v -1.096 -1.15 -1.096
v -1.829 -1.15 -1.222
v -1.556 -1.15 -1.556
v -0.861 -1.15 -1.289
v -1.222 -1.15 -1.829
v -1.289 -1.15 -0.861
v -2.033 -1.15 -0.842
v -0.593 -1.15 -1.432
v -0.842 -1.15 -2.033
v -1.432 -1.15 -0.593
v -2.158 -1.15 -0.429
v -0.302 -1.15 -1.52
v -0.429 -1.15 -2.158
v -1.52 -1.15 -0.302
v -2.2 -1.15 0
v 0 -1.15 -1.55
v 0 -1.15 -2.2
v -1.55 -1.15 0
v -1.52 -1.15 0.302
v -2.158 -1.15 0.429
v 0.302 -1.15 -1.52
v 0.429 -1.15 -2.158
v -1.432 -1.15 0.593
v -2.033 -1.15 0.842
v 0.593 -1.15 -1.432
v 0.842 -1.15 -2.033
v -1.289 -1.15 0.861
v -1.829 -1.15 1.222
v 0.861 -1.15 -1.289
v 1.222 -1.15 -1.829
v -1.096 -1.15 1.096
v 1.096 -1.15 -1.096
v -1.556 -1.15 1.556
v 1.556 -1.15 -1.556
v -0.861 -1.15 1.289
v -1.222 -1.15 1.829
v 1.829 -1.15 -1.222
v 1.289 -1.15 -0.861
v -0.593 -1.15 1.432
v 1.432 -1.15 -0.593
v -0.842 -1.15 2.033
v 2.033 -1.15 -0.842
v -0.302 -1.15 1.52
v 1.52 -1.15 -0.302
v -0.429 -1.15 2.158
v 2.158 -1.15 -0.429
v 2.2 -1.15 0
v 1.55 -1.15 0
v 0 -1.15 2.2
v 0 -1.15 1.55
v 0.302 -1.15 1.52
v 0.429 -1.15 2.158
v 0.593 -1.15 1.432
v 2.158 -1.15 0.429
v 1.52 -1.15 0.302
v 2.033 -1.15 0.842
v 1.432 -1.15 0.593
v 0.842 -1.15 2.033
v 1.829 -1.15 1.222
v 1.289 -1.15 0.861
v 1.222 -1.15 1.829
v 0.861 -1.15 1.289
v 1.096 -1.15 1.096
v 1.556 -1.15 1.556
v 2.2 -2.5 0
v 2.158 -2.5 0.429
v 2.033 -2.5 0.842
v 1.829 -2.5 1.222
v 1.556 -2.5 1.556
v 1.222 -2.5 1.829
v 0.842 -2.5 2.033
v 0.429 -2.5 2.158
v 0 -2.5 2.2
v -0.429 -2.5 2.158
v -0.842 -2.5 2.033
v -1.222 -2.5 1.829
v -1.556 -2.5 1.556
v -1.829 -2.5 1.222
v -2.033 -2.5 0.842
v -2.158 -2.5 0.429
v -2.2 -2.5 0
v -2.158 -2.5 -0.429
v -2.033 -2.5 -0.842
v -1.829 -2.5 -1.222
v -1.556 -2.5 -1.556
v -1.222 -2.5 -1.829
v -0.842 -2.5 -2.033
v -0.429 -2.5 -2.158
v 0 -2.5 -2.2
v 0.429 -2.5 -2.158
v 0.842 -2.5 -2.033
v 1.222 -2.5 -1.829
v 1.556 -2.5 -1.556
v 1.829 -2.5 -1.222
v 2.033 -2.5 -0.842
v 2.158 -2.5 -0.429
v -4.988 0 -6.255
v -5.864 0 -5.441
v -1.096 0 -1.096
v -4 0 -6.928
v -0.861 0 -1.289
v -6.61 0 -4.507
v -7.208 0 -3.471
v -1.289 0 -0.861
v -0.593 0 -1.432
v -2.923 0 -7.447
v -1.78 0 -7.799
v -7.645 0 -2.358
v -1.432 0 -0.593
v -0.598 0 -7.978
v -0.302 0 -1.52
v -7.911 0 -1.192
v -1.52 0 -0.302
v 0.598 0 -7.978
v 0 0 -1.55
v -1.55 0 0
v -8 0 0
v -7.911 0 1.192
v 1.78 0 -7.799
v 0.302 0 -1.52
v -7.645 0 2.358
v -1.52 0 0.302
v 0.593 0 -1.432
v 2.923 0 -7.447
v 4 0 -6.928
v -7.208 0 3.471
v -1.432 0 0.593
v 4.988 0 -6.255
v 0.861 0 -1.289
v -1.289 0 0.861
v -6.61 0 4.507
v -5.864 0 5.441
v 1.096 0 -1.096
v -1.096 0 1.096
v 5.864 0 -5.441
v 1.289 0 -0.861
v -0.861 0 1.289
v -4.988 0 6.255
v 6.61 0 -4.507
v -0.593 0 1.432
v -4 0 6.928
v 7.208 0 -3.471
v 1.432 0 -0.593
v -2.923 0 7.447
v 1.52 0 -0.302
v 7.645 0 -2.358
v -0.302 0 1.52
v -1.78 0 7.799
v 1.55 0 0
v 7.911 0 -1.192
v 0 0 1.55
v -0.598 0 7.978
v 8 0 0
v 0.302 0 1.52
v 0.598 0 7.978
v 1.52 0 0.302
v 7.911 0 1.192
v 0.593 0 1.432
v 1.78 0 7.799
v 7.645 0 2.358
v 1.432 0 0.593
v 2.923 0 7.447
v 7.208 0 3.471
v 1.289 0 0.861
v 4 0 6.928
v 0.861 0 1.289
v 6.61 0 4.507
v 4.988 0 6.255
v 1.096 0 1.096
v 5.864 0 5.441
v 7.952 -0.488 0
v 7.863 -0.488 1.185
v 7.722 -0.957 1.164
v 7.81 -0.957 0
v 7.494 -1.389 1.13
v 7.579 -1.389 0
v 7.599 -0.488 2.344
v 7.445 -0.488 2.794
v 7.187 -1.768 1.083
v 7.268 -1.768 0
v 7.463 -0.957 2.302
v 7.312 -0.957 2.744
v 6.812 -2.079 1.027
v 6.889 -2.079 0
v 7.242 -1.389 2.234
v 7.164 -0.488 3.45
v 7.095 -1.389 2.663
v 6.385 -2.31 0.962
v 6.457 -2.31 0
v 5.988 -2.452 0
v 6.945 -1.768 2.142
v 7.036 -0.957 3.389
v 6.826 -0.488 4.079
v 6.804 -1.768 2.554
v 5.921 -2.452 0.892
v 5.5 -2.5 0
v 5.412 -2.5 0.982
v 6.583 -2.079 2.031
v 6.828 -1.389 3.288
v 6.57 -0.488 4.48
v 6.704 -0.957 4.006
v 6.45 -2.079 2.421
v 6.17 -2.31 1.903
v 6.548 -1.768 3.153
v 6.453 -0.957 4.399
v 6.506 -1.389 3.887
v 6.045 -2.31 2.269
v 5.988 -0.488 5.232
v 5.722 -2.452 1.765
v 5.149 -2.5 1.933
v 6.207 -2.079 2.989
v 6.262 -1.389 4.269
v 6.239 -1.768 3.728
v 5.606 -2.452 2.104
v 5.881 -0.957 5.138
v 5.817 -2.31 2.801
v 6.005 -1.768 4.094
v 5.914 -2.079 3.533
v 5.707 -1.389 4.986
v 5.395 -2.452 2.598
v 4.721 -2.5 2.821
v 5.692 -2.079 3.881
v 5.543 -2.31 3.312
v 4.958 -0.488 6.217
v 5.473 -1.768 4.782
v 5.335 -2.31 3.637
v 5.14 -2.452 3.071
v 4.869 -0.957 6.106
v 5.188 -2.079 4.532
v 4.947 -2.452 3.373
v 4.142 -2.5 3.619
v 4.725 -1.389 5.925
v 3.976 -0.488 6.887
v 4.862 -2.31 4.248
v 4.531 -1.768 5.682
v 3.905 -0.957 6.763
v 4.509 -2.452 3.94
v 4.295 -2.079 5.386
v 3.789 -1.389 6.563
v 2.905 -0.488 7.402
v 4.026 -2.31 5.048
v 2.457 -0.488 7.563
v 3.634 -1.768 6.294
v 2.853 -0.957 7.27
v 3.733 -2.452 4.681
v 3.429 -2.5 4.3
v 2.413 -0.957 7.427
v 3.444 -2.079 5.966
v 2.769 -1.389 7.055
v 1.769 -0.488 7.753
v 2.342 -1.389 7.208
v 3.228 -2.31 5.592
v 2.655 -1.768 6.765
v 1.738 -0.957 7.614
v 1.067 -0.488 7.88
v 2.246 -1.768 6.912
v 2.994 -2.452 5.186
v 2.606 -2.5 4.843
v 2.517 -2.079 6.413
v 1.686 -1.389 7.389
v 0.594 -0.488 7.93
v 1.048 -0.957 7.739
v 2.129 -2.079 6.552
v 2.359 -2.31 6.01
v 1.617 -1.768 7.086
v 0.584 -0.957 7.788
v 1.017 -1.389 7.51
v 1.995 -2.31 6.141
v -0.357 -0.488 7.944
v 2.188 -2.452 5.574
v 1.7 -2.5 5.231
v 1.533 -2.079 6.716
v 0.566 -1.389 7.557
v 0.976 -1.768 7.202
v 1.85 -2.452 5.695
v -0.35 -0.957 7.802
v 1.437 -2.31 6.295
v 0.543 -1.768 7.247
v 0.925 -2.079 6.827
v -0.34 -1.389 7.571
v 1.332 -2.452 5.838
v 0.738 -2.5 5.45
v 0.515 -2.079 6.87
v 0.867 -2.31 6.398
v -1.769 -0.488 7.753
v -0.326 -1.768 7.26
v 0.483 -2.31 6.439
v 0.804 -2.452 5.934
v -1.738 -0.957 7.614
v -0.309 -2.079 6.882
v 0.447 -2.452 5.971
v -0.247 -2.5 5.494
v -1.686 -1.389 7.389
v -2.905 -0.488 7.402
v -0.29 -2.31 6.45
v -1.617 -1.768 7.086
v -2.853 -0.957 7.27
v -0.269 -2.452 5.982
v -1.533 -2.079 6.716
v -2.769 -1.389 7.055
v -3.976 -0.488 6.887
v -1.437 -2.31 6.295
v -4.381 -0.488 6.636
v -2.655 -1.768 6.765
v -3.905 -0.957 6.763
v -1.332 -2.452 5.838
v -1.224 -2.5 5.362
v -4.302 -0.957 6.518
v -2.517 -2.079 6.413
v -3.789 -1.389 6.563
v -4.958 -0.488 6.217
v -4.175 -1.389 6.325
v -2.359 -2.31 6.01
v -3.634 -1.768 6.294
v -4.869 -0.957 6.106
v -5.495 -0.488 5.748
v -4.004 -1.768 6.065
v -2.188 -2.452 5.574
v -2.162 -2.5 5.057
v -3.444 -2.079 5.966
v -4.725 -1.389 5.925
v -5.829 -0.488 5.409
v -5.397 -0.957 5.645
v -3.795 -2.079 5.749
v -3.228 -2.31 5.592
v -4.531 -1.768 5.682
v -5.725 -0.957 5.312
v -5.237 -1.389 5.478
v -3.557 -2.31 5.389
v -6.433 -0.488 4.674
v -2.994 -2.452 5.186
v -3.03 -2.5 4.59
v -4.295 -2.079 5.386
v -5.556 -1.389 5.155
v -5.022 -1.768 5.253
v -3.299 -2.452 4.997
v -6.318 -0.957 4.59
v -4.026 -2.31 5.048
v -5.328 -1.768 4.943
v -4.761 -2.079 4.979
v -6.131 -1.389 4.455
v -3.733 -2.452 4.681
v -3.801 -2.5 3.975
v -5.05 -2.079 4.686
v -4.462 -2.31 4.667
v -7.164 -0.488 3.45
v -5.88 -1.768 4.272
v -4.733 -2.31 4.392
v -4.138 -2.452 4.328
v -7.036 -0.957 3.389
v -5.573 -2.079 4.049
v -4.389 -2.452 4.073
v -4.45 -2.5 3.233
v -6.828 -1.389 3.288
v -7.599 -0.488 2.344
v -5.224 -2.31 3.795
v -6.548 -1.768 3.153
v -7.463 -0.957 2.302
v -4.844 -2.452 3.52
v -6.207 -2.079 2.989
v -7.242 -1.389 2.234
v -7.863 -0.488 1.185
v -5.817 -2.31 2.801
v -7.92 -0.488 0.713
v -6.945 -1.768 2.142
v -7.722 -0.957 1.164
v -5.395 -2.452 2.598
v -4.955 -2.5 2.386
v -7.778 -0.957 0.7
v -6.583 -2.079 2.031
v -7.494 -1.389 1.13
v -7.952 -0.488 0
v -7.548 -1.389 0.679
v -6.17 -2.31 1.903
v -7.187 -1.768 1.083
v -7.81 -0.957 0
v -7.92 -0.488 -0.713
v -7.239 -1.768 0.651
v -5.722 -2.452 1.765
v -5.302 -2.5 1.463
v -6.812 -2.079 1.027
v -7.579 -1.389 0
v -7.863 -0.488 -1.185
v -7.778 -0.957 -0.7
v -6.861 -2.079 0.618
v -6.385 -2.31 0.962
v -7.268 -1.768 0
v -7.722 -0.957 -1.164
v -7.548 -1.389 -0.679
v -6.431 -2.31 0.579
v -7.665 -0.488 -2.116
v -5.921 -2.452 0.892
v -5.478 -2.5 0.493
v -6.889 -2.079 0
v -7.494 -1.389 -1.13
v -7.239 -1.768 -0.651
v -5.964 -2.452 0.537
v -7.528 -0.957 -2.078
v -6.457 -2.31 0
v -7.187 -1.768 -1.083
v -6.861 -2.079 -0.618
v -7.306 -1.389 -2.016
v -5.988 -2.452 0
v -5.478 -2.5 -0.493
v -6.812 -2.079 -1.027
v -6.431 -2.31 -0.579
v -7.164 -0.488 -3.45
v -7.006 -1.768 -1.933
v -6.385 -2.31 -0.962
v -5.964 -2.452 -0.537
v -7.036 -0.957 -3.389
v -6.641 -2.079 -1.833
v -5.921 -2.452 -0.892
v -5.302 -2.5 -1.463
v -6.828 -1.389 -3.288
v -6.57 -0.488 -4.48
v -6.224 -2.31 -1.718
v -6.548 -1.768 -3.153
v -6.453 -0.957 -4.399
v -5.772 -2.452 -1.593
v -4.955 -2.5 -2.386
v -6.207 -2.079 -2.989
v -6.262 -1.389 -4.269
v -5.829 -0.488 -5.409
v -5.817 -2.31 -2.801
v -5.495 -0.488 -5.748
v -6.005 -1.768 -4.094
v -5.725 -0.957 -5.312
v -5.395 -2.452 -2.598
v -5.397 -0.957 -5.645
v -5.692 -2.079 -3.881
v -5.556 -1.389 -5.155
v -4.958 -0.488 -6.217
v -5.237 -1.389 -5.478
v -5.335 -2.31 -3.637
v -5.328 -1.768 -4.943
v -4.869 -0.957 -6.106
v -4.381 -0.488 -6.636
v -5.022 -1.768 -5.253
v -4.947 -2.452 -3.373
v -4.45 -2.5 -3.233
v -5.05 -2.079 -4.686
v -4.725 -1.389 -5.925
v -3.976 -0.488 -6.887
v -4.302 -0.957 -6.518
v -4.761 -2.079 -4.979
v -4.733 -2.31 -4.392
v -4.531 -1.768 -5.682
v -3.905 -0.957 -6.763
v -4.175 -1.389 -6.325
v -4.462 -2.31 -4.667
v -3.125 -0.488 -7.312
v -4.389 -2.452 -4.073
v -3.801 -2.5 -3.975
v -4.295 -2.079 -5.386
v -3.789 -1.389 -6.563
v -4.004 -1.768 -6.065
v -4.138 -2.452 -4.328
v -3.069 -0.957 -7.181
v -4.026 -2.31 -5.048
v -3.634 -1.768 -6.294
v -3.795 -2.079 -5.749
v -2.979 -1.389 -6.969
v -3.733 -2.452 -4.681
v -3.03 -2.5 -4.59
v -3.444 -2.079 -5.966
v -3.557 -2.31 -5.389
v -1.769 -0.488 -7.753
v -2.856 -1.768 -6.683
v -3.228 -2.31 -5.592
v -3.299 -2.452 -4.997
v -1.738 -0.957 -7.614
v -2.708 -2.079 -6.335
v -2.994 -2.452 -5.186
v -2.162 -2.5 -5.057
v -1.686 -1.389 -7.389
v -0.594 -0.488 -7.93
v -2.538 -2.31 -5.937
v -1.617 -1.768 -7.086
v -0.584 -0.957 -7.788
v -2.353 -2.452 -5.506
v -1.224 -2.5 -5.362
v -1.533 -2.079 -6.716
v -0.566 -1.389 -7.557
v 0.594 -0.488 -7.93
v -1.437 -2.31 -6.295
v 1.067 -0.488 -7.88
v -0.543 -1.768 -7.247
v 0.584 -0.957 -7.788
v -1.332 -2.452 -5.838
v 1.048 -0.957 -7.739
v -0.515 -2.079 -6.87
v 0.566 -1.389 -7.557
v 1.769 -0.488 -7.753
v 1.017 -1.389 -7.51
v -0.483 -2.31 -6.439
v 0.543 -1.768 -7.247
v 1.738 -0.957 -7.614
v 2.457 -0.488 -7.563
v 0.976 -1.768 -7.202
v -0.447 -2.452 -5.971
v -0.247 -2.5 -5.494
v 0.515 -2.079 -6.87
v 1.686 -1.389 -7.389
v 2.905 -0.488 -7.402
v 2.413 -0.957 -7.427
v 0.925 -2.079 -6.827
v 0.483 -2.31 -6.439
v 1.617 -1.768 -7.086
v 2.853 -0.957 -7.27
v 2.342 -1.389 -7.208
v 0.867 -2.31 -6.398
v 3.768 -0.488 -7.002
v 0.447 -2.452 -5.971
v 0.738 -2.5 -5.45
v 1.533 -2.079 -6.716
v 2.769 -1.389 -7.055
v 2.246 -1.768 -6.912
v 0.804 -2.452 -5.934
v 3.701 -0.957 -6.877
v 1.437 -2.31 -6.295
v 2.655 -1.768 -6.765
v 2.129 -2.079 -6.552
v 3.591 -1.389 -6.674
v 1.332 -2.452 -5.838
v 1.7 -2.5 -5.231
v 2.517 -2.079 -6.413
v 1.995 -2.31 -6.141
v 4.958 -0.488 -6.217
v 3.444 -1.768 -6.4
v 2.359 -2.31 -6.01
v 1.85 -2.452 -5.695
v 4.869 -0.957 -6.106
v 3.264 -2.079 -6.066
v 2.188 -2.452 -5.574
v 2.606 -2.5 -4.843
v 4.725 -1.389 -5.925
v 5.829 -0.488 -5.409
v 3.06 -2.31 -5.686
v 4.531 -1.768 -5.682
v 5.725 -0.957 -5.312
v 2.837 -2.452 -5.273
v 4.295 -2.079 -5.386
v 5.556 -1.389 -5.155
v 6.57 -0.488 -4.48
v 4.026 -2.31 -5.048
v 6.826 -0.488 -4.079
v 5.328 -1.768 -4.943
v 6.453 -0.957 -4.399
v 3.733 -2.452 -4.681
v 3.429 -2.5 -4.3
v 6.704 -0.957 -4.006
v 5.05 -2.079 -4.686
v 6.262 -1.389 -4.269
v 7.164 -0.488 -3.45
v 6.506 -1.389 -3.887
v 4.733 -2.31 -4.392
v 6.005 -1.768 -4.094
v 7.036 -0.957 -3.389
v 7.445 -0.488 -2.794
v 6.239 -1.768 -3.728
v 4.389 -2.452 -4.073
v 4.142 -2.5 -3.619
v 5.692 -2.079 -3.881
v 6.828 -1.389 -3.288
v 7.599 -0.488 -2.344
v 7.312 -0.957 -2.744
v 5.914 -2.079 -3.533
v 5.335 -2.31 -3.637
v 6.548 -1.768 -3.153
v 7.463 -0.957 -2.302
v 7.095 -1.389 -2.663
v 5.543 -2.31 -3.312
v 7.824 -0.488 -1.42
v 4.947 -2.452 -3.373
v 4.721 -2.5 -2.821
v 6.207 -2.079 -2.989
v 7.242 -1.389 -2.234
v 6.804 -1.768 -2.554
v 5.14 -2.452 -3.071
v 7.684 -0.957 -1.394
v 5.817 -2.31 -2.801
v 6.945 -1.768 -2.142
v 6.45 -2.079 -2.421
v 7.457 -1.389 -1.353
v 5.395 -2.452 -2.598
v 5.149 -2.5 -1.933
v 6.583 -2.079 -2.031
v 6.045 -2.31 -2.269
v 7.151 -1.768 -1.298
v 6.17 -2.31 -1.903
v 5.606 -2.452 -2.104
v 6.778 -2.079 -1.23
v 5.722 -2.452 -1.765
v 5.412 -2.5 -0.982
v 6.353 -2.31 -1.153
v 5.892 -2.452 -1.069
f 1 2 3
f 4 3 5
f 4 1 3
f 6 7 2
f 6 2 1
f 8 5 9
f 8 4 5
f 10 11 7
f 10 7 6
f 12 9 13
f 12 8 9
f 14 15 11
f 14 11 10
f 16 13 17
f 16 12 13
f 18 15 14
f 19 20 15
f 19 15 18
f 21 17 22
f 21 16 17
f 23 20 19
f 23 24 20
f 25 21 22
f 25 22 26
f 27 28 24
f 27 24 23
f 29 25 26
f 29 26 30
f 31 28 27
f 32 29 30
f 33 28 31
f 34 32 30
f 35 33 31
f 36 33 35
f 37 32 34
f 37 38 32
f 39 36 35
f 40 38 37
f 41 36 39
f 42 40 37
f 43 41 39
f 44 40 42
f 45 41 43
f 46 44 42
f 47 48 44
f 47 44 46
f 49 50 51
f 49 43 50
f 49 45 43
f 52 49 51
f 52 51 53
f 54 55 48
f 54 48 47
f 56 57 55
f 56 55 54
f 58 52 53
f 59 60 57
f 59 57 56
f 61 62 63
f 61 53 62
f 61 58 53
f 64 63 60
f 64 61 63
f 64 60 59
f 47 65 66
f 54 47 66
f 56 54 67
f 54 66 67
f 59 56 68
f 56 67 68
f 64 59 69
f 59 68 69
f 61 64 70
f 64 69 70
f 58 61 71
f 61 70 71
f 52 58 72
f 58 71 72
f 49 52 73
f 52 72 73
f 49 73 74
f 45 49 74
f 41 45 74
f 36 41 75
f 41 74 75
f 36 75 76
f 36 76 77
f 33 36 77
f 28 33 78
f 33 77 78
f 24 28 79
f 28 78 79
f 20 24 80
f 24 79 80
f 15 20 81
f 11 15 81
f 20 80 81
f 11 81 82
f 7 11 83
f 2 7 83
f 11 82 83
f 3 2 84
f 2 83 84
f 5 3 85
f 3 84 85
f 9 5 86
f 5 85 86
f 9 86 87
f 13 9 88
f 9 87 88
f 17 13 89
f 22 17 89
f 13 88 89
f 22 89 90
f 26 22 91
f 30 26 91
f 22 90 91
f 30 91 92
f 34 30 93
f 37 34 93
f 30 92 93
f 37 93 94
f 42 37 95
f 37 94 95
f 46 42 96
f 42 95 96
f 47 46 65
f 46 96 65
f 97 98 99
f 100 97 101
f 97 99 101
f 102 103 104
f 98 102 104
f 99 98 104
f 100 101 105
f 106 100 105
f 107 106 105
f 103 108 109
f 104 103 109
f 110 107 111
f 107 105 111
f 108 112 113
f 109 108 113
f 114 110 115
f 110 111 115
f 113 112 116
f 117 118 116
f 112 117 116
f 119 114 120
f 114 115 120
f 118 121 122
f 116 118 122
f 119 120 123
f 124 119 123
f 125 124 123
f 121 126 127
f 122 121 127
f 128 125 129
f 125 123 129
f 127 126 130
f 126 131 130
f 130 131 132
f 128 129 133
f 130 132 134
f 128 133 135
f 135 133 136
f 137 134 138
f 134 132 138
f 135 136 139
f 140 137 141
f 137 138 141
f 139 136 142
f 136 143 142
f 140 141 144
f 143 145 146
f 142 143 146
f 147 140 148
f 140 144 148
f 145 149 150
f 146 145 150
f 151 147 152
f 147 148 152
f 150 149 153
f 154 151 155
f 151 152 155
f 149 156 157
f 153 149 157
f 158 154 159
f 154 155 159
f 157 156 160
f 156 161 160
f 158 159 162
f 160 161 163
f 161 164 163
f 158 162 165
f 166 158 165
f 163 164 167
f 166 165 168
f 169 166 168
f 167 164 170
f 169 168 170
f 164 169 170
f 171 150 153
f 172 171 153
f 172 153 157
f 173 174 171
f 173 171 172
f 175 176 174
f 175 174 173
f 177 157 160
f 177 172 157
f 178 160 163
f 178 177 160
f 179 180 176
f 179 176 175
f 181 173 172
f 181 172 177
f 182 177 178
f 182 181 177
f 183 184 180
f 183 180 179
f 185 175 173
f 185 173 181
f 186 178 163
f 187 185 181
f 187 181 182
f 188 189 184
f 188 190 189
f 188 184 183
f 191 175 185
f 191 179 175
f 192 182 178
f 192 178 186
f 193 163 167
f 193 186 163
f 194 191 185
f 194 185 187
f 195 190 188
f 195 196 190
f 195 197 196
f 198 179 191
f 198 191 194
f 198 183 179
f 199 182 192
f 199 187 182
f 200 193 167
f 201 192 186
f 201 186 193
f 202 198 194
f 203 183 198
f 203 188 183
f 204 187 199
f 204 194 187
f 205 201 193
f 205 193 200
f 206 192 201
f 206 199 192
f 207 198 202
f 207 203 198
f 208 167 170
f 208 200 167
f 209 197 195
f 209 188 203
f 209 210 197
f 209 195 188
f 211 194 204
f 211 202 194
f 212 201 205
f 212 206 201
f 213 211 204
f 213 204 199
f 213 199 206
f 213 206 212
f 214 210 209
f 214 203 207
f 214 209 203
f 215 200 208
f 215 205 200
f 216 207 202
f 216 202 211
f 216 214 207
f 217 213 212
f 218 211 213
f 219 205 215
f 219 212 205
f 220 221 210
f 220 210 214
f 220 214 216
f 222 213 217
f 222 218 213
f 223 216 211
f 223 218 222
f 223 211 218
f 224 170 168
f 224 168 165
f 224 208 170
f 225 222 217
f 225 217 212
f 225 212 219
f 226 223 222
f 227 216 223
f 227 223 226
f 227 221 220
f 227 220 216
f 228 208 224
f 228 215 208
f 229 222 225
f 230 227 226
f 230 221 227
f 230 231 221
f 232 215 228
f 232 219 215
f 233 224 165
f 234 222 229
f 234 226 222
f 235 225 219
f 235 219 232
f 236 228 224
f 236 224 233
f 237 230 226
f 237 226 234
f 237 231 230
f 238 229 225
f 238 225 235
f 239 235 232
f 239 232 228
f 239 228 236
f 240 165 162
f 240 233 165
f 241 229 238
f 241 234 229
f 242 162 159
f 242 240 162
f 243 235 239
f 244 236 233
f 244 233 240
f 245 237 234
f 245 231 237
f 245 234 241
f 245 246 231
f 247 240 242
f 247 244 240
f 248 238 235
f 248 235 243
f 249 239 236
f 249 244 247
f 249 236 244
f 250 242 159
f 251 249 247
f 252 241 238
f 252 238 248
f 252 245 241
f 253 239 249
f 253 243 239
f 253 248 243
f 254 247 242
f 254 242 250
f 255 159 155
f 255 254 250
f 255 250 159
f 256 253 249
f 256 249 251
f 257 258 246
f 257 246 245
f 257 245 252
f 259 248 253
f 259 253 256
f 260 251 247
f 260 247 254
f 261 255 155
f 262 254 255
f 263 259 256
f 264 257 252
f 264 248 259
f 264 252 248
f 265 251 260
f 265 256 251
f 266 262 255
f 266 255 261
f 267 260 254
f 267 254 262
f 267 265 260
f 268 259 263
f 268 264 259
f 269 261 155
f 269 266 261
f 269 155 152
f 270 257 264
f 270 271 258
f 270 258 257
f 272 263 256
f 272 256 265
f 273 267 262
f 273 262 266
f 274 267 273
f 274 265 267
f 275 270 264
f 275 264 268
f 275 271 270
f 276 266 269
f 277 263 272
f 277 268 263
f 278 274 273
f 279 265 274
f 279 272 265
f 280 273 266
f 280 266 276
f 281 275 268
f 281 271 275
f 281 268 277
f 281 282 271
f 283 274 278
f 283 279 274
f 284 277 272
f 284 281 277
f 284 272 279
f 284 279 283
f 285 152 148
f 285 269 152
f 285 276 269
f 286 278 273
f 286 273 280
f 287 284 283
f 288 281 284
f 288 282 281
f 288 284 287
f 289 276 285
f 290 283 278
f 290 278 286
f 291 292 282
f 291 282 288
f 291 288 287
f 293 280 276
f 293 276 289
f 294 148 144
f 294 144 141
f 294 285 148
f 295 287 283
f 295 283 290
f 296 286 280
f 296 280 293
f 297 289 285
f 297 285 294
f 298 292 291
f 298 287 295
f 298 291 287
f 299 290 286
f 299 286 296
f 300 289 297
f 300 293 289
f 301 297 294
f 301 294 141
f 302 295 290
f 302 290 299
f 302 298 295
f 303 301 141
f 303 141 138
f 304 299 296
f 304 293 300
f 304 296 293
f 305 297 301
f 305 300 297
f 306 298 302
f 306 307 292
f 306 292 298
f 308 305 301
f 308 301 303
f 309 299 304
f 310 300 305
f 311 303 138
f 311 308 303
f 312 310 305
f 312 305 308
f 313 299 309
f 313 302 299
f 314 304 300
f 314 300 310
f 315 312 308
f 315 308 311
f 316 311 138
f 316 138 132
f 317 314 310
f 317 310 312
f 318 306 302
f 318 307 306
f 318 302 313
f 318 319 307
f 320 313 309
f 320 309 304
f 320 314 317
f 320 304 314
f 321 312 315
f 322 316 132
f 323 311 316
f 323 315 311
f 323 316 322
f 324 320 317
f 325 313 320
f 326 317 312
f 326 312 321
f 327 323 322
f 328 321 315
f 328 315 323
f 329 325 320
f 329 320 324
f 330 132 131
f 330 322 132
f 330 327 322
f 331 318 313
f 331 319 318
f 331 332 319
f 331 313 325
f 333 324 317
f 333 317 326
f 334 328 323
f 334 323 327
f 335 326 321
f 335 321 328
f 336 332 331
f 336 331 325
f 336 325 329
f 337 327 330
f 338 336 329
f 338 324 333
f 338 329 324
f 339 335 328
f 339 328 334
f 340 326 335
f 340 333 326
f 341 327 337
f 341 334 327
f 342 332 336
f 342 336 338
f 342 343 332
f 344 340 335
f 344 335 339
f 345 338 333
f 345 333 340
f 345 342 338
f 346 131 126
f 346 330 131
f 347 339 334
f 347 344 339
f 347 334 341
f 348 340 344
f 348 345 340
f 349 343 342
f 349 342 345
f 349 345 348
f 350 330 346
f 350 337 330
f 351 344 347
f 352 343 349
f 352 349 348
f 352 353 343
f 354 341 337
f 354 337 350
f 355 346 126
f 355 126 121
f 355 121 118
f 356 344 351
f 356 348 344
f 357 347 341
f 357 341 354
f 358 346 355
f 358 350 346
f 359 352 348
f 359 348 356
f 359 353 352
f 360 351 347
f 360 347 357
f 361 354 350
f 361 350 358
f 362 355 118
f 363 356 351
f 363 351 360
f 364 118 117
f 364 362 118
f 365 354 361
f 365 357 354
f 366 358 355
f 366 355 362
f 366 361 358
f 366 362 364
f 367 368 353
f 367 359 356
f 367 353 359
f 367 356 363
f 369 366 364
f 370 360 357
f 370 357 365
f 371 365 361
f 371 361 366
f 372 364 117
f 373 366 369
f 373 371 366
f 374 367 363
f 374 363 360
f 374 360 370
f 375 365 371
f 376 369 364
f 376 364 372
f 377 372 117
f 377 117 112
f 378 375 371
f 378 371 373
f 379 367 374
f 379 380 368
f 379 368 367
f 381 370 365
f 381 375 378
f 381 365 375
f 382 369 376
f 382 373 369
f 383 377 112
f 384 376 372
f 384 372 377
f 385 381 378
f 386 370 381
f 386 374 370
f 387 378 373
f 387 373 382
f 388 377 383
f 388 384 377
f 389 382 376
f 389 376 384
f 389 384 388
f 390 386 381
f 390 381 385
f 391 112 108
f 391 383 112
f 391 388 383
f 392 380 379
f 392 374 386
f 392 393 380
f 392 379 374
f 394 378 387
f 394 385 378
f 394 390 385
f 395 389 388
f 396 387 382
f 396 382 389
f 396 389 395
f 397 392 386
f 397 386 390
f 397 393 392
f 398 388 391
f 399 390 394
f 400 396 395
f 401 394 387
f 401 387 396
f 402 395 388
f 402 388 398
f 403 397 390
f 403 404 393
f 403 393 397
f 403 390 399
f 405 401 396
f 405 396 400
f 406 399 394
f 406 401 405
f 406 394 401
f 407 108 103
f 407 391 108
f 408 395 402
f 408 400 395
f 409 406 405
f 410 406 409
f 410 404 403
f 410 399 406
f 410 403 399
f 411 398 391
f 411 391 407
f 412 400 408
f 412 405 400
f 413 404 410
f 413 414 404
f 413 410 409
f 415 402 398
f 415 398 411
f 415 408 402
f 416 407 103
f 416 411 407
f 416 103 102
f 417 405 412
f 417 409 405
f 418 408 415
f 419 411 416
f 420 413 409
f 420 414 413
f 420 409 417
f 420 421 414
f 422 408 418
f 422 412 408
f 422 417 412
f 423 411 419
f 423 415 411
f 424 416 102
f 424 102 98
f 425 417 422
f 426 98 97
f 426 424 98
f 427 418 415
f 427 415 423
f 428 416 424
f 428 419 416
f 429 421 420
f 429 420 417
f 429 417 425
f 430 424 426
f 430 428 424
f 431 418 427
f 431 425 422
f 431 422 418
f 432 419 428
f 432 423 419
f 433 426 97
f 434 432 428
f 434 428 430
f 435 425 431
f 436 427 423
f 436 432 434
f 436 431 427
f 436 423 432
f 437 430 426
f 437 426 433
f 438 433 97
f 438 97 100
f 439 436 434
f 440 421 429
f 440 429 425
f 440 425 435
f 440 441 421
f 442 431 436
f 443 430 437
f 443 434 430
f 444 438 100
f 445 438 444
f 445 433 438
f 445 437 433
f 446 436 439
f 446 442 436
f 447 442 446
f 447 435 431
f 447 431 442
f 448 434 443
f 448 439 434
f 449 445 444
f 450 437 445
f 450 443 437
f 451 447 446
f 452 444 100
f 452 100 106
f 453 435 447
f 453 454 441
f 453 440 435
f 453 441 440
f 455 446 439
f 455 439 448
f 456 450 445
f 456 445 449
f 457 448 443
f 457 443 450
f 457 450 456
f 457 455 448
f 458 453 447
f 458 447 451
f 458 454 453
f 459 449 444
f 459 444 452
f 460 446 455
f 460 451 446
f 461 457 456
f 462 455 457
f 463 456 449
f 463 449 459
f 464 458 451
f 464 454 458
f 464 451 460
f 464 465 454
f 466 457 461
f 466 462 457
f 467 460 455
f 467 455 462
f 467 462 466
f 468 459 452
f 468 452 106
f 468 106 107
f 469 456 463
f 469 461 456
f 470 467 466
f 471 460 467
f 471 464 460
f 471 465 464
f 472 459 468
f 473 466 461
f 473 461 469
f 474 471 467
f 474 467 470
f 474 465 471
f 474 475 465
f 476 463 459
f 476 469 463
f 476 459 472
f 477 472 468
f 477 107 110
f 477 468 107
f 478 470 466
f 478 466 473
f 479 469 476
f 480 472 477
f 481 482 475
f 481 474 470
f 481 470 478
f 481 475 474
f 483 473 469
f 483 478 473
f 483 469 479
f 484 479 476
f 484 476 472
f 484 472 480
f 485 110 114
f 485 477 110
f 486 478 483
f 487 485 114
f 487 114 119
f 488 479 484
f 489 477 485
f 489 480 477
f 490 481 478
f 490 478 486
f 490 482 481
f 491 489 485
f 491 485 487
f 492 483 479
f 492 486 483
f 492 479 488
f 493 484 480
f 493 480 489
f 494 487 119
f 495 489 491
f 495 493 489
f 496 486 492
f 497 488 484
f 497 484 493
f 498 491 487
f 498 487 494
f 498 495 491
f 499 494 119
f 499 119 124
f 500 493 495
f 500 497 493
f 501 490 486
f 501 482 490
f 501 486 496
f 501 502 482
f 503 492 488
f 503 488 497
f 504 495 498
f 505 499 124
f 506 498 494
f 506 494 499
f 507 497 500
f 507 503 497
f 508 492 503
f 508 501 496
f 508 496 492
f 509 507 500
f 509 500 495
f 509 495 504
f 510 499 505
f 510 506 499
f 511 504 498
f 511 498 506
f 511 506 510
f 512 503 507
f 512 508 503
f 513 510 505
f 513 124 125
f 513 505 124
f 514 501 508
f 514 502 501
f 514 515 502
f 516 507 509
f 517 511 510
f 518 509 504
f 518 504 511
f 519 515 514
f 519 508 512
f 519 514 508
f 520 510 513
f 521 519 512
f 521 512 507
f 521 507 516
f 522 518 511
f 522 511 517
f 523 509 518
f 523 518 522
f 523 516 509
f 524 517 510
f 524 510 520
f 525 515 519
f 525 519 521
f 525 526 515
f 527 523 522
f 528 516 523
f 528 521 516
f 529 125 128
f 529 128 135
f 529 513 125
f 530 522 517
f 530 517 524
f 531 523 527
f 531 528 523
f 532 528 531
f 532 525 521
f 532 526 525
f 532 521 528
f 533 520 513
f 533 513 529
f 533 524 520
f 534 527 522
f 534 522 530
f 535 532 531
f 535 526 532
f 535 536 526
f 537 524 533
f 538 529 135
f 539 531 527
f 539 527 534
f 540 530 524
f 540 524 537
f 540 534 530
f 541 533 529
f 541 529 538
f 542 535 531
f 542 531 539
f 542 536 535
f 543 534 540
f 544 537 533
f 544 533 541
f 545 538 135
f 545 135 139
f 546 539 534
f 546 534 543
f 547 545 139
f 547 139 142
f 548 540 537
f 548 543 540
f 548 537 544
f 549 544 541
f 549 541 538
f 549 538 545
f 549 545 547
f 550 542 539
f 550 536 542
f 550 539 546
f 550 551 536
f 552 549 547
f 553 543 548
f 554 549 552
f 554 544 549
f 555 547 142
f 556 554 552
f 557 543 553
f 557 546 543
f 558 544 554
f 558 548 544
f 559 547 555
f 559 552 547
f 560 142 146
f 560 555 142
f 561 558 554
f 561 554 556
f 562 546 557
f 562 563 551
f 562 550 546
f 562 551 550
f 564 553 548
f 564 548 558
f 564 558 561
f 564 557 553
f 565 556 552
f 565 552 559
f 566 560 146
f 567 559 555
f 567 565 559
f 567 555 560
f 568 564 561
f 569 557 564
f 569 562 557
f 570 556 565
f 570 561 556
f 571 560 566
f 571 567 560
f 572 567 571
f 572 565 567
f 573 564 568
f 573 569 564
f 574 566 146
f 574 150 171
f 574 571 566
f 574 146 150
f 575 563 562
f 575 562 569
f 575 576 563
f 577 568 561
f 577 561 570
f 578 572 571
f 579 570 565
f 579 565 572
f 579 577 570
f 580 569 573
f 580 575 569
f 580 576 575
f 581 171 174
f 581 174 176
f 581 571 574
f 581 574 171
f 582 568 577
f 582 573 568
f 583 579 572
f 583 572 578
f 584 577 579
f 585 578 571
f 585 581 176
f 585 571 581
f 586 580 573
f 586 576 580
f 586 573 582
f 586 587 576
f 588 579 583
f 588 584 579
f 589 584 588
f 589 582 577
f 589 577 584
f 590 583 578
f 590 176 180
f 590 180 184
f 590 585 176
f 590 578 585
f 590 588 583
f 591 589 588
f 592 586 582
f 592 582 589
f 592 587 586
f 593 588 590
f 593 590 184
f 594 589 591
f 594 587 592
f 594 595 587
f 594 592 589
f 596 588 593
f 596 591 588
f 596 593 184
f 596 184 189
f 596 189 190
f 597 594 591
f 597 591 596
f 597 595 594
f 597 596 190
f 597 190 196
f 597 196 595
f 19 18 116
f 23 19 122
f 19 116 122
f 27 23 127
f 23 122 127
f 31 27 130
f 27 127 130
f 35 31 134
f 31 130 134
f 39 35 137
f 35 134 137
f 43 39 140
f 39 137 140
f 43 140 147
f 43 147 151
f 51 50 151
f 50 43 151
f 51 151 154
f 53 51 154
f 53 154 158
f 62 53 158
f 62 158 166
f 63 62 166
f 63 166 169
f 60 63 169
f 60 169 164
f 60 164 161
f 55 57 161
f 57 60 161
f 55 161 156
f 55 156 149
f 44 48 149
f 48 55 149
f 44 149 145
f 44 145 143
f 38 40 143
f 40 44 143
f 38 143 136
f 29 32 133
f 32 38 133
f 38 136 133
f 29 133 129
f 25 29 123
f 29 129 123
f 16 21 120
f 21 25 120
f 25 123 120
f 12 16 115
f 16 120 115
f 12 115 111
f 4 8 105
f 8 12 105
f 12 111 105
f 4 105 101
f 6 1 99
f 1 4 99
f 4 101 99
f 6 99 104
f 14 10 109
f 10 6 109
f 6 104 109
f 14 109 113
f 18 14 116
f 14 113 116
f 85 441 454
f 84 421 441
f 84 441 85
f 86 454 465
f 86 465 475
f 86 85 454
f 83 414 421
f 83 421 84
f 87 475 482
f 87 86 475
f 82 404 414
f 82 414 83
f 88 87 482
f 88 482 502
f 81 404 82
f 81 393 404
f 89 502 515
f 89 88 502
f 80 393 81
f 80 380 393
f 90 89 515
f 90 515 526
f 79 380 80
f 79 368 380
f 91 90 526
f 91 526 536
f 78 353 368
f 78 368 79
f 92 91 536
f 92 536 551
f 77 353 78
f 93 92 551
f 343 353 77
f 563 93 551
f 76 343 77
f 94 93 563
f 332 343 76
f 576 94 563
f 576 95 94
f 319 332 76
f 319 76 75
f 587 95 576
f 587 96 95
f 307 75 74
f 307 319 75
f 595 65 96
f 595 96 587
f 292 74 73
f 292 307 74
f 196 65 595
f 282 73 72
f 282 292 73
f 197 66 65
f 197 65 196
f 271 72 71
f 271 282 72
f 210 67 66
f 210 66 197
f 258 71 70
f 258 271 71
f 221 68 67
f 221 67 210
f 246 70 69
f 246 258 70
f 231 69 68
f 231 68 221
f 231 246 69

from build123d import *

# Parameters (mm, degrees)
F0_R     = 8
F1_DEPTH = 2.5
F2_R     = 2.49999
F3_R     = 1.55
F4_DEPTH = 25
F5_R     = 2.2
F5_R_2   = 1.55
F6_DEPTH = 1.35


# Not quite as in the source:
# - a fillet or chamfer is up to 0.001 mm smaller than in the source, because OpenCascade refuses the exact size


with BuildPart() as f1:
    # F0 (on Front) → F1 (new body)
    with BuildSketch(Plane.XZ):
        Circle(F0_R)
    extrude(amount=F1_DEPTH)

    # F2 (radius 2.5 in the source; OpenCascade refuses exactly that, so slightly less here)
    f2_edges = [f1.edges().sort_by_distance(p)[0] for p in [
        (-8, -2.5, 0),
    ]]
    fillet(f2_edges, radius=F2_R)

    # F3 (on face) → F4 (cut)
    with BuildSketch(Plane(origin=(0, 0, 0), x_dir=(-1, 0, 0), z_dir=(0, 1, 0))):
        Circle(F3_R)
    extrude(amount=-F4_DEPTH, mode=Mode.SUBTRACT)

    # F5 (on face) → F6 (cut)
    with BuildSketch(Plane.XZ.offset(2.5)):
        Circle(F5_R)
        Circle(F5_R_2, mode=Mode.SUBTRACT)
    extrude(amount=-F6_DEPTH, mode=Mode.SUBTRACT)


solid = f1.part
